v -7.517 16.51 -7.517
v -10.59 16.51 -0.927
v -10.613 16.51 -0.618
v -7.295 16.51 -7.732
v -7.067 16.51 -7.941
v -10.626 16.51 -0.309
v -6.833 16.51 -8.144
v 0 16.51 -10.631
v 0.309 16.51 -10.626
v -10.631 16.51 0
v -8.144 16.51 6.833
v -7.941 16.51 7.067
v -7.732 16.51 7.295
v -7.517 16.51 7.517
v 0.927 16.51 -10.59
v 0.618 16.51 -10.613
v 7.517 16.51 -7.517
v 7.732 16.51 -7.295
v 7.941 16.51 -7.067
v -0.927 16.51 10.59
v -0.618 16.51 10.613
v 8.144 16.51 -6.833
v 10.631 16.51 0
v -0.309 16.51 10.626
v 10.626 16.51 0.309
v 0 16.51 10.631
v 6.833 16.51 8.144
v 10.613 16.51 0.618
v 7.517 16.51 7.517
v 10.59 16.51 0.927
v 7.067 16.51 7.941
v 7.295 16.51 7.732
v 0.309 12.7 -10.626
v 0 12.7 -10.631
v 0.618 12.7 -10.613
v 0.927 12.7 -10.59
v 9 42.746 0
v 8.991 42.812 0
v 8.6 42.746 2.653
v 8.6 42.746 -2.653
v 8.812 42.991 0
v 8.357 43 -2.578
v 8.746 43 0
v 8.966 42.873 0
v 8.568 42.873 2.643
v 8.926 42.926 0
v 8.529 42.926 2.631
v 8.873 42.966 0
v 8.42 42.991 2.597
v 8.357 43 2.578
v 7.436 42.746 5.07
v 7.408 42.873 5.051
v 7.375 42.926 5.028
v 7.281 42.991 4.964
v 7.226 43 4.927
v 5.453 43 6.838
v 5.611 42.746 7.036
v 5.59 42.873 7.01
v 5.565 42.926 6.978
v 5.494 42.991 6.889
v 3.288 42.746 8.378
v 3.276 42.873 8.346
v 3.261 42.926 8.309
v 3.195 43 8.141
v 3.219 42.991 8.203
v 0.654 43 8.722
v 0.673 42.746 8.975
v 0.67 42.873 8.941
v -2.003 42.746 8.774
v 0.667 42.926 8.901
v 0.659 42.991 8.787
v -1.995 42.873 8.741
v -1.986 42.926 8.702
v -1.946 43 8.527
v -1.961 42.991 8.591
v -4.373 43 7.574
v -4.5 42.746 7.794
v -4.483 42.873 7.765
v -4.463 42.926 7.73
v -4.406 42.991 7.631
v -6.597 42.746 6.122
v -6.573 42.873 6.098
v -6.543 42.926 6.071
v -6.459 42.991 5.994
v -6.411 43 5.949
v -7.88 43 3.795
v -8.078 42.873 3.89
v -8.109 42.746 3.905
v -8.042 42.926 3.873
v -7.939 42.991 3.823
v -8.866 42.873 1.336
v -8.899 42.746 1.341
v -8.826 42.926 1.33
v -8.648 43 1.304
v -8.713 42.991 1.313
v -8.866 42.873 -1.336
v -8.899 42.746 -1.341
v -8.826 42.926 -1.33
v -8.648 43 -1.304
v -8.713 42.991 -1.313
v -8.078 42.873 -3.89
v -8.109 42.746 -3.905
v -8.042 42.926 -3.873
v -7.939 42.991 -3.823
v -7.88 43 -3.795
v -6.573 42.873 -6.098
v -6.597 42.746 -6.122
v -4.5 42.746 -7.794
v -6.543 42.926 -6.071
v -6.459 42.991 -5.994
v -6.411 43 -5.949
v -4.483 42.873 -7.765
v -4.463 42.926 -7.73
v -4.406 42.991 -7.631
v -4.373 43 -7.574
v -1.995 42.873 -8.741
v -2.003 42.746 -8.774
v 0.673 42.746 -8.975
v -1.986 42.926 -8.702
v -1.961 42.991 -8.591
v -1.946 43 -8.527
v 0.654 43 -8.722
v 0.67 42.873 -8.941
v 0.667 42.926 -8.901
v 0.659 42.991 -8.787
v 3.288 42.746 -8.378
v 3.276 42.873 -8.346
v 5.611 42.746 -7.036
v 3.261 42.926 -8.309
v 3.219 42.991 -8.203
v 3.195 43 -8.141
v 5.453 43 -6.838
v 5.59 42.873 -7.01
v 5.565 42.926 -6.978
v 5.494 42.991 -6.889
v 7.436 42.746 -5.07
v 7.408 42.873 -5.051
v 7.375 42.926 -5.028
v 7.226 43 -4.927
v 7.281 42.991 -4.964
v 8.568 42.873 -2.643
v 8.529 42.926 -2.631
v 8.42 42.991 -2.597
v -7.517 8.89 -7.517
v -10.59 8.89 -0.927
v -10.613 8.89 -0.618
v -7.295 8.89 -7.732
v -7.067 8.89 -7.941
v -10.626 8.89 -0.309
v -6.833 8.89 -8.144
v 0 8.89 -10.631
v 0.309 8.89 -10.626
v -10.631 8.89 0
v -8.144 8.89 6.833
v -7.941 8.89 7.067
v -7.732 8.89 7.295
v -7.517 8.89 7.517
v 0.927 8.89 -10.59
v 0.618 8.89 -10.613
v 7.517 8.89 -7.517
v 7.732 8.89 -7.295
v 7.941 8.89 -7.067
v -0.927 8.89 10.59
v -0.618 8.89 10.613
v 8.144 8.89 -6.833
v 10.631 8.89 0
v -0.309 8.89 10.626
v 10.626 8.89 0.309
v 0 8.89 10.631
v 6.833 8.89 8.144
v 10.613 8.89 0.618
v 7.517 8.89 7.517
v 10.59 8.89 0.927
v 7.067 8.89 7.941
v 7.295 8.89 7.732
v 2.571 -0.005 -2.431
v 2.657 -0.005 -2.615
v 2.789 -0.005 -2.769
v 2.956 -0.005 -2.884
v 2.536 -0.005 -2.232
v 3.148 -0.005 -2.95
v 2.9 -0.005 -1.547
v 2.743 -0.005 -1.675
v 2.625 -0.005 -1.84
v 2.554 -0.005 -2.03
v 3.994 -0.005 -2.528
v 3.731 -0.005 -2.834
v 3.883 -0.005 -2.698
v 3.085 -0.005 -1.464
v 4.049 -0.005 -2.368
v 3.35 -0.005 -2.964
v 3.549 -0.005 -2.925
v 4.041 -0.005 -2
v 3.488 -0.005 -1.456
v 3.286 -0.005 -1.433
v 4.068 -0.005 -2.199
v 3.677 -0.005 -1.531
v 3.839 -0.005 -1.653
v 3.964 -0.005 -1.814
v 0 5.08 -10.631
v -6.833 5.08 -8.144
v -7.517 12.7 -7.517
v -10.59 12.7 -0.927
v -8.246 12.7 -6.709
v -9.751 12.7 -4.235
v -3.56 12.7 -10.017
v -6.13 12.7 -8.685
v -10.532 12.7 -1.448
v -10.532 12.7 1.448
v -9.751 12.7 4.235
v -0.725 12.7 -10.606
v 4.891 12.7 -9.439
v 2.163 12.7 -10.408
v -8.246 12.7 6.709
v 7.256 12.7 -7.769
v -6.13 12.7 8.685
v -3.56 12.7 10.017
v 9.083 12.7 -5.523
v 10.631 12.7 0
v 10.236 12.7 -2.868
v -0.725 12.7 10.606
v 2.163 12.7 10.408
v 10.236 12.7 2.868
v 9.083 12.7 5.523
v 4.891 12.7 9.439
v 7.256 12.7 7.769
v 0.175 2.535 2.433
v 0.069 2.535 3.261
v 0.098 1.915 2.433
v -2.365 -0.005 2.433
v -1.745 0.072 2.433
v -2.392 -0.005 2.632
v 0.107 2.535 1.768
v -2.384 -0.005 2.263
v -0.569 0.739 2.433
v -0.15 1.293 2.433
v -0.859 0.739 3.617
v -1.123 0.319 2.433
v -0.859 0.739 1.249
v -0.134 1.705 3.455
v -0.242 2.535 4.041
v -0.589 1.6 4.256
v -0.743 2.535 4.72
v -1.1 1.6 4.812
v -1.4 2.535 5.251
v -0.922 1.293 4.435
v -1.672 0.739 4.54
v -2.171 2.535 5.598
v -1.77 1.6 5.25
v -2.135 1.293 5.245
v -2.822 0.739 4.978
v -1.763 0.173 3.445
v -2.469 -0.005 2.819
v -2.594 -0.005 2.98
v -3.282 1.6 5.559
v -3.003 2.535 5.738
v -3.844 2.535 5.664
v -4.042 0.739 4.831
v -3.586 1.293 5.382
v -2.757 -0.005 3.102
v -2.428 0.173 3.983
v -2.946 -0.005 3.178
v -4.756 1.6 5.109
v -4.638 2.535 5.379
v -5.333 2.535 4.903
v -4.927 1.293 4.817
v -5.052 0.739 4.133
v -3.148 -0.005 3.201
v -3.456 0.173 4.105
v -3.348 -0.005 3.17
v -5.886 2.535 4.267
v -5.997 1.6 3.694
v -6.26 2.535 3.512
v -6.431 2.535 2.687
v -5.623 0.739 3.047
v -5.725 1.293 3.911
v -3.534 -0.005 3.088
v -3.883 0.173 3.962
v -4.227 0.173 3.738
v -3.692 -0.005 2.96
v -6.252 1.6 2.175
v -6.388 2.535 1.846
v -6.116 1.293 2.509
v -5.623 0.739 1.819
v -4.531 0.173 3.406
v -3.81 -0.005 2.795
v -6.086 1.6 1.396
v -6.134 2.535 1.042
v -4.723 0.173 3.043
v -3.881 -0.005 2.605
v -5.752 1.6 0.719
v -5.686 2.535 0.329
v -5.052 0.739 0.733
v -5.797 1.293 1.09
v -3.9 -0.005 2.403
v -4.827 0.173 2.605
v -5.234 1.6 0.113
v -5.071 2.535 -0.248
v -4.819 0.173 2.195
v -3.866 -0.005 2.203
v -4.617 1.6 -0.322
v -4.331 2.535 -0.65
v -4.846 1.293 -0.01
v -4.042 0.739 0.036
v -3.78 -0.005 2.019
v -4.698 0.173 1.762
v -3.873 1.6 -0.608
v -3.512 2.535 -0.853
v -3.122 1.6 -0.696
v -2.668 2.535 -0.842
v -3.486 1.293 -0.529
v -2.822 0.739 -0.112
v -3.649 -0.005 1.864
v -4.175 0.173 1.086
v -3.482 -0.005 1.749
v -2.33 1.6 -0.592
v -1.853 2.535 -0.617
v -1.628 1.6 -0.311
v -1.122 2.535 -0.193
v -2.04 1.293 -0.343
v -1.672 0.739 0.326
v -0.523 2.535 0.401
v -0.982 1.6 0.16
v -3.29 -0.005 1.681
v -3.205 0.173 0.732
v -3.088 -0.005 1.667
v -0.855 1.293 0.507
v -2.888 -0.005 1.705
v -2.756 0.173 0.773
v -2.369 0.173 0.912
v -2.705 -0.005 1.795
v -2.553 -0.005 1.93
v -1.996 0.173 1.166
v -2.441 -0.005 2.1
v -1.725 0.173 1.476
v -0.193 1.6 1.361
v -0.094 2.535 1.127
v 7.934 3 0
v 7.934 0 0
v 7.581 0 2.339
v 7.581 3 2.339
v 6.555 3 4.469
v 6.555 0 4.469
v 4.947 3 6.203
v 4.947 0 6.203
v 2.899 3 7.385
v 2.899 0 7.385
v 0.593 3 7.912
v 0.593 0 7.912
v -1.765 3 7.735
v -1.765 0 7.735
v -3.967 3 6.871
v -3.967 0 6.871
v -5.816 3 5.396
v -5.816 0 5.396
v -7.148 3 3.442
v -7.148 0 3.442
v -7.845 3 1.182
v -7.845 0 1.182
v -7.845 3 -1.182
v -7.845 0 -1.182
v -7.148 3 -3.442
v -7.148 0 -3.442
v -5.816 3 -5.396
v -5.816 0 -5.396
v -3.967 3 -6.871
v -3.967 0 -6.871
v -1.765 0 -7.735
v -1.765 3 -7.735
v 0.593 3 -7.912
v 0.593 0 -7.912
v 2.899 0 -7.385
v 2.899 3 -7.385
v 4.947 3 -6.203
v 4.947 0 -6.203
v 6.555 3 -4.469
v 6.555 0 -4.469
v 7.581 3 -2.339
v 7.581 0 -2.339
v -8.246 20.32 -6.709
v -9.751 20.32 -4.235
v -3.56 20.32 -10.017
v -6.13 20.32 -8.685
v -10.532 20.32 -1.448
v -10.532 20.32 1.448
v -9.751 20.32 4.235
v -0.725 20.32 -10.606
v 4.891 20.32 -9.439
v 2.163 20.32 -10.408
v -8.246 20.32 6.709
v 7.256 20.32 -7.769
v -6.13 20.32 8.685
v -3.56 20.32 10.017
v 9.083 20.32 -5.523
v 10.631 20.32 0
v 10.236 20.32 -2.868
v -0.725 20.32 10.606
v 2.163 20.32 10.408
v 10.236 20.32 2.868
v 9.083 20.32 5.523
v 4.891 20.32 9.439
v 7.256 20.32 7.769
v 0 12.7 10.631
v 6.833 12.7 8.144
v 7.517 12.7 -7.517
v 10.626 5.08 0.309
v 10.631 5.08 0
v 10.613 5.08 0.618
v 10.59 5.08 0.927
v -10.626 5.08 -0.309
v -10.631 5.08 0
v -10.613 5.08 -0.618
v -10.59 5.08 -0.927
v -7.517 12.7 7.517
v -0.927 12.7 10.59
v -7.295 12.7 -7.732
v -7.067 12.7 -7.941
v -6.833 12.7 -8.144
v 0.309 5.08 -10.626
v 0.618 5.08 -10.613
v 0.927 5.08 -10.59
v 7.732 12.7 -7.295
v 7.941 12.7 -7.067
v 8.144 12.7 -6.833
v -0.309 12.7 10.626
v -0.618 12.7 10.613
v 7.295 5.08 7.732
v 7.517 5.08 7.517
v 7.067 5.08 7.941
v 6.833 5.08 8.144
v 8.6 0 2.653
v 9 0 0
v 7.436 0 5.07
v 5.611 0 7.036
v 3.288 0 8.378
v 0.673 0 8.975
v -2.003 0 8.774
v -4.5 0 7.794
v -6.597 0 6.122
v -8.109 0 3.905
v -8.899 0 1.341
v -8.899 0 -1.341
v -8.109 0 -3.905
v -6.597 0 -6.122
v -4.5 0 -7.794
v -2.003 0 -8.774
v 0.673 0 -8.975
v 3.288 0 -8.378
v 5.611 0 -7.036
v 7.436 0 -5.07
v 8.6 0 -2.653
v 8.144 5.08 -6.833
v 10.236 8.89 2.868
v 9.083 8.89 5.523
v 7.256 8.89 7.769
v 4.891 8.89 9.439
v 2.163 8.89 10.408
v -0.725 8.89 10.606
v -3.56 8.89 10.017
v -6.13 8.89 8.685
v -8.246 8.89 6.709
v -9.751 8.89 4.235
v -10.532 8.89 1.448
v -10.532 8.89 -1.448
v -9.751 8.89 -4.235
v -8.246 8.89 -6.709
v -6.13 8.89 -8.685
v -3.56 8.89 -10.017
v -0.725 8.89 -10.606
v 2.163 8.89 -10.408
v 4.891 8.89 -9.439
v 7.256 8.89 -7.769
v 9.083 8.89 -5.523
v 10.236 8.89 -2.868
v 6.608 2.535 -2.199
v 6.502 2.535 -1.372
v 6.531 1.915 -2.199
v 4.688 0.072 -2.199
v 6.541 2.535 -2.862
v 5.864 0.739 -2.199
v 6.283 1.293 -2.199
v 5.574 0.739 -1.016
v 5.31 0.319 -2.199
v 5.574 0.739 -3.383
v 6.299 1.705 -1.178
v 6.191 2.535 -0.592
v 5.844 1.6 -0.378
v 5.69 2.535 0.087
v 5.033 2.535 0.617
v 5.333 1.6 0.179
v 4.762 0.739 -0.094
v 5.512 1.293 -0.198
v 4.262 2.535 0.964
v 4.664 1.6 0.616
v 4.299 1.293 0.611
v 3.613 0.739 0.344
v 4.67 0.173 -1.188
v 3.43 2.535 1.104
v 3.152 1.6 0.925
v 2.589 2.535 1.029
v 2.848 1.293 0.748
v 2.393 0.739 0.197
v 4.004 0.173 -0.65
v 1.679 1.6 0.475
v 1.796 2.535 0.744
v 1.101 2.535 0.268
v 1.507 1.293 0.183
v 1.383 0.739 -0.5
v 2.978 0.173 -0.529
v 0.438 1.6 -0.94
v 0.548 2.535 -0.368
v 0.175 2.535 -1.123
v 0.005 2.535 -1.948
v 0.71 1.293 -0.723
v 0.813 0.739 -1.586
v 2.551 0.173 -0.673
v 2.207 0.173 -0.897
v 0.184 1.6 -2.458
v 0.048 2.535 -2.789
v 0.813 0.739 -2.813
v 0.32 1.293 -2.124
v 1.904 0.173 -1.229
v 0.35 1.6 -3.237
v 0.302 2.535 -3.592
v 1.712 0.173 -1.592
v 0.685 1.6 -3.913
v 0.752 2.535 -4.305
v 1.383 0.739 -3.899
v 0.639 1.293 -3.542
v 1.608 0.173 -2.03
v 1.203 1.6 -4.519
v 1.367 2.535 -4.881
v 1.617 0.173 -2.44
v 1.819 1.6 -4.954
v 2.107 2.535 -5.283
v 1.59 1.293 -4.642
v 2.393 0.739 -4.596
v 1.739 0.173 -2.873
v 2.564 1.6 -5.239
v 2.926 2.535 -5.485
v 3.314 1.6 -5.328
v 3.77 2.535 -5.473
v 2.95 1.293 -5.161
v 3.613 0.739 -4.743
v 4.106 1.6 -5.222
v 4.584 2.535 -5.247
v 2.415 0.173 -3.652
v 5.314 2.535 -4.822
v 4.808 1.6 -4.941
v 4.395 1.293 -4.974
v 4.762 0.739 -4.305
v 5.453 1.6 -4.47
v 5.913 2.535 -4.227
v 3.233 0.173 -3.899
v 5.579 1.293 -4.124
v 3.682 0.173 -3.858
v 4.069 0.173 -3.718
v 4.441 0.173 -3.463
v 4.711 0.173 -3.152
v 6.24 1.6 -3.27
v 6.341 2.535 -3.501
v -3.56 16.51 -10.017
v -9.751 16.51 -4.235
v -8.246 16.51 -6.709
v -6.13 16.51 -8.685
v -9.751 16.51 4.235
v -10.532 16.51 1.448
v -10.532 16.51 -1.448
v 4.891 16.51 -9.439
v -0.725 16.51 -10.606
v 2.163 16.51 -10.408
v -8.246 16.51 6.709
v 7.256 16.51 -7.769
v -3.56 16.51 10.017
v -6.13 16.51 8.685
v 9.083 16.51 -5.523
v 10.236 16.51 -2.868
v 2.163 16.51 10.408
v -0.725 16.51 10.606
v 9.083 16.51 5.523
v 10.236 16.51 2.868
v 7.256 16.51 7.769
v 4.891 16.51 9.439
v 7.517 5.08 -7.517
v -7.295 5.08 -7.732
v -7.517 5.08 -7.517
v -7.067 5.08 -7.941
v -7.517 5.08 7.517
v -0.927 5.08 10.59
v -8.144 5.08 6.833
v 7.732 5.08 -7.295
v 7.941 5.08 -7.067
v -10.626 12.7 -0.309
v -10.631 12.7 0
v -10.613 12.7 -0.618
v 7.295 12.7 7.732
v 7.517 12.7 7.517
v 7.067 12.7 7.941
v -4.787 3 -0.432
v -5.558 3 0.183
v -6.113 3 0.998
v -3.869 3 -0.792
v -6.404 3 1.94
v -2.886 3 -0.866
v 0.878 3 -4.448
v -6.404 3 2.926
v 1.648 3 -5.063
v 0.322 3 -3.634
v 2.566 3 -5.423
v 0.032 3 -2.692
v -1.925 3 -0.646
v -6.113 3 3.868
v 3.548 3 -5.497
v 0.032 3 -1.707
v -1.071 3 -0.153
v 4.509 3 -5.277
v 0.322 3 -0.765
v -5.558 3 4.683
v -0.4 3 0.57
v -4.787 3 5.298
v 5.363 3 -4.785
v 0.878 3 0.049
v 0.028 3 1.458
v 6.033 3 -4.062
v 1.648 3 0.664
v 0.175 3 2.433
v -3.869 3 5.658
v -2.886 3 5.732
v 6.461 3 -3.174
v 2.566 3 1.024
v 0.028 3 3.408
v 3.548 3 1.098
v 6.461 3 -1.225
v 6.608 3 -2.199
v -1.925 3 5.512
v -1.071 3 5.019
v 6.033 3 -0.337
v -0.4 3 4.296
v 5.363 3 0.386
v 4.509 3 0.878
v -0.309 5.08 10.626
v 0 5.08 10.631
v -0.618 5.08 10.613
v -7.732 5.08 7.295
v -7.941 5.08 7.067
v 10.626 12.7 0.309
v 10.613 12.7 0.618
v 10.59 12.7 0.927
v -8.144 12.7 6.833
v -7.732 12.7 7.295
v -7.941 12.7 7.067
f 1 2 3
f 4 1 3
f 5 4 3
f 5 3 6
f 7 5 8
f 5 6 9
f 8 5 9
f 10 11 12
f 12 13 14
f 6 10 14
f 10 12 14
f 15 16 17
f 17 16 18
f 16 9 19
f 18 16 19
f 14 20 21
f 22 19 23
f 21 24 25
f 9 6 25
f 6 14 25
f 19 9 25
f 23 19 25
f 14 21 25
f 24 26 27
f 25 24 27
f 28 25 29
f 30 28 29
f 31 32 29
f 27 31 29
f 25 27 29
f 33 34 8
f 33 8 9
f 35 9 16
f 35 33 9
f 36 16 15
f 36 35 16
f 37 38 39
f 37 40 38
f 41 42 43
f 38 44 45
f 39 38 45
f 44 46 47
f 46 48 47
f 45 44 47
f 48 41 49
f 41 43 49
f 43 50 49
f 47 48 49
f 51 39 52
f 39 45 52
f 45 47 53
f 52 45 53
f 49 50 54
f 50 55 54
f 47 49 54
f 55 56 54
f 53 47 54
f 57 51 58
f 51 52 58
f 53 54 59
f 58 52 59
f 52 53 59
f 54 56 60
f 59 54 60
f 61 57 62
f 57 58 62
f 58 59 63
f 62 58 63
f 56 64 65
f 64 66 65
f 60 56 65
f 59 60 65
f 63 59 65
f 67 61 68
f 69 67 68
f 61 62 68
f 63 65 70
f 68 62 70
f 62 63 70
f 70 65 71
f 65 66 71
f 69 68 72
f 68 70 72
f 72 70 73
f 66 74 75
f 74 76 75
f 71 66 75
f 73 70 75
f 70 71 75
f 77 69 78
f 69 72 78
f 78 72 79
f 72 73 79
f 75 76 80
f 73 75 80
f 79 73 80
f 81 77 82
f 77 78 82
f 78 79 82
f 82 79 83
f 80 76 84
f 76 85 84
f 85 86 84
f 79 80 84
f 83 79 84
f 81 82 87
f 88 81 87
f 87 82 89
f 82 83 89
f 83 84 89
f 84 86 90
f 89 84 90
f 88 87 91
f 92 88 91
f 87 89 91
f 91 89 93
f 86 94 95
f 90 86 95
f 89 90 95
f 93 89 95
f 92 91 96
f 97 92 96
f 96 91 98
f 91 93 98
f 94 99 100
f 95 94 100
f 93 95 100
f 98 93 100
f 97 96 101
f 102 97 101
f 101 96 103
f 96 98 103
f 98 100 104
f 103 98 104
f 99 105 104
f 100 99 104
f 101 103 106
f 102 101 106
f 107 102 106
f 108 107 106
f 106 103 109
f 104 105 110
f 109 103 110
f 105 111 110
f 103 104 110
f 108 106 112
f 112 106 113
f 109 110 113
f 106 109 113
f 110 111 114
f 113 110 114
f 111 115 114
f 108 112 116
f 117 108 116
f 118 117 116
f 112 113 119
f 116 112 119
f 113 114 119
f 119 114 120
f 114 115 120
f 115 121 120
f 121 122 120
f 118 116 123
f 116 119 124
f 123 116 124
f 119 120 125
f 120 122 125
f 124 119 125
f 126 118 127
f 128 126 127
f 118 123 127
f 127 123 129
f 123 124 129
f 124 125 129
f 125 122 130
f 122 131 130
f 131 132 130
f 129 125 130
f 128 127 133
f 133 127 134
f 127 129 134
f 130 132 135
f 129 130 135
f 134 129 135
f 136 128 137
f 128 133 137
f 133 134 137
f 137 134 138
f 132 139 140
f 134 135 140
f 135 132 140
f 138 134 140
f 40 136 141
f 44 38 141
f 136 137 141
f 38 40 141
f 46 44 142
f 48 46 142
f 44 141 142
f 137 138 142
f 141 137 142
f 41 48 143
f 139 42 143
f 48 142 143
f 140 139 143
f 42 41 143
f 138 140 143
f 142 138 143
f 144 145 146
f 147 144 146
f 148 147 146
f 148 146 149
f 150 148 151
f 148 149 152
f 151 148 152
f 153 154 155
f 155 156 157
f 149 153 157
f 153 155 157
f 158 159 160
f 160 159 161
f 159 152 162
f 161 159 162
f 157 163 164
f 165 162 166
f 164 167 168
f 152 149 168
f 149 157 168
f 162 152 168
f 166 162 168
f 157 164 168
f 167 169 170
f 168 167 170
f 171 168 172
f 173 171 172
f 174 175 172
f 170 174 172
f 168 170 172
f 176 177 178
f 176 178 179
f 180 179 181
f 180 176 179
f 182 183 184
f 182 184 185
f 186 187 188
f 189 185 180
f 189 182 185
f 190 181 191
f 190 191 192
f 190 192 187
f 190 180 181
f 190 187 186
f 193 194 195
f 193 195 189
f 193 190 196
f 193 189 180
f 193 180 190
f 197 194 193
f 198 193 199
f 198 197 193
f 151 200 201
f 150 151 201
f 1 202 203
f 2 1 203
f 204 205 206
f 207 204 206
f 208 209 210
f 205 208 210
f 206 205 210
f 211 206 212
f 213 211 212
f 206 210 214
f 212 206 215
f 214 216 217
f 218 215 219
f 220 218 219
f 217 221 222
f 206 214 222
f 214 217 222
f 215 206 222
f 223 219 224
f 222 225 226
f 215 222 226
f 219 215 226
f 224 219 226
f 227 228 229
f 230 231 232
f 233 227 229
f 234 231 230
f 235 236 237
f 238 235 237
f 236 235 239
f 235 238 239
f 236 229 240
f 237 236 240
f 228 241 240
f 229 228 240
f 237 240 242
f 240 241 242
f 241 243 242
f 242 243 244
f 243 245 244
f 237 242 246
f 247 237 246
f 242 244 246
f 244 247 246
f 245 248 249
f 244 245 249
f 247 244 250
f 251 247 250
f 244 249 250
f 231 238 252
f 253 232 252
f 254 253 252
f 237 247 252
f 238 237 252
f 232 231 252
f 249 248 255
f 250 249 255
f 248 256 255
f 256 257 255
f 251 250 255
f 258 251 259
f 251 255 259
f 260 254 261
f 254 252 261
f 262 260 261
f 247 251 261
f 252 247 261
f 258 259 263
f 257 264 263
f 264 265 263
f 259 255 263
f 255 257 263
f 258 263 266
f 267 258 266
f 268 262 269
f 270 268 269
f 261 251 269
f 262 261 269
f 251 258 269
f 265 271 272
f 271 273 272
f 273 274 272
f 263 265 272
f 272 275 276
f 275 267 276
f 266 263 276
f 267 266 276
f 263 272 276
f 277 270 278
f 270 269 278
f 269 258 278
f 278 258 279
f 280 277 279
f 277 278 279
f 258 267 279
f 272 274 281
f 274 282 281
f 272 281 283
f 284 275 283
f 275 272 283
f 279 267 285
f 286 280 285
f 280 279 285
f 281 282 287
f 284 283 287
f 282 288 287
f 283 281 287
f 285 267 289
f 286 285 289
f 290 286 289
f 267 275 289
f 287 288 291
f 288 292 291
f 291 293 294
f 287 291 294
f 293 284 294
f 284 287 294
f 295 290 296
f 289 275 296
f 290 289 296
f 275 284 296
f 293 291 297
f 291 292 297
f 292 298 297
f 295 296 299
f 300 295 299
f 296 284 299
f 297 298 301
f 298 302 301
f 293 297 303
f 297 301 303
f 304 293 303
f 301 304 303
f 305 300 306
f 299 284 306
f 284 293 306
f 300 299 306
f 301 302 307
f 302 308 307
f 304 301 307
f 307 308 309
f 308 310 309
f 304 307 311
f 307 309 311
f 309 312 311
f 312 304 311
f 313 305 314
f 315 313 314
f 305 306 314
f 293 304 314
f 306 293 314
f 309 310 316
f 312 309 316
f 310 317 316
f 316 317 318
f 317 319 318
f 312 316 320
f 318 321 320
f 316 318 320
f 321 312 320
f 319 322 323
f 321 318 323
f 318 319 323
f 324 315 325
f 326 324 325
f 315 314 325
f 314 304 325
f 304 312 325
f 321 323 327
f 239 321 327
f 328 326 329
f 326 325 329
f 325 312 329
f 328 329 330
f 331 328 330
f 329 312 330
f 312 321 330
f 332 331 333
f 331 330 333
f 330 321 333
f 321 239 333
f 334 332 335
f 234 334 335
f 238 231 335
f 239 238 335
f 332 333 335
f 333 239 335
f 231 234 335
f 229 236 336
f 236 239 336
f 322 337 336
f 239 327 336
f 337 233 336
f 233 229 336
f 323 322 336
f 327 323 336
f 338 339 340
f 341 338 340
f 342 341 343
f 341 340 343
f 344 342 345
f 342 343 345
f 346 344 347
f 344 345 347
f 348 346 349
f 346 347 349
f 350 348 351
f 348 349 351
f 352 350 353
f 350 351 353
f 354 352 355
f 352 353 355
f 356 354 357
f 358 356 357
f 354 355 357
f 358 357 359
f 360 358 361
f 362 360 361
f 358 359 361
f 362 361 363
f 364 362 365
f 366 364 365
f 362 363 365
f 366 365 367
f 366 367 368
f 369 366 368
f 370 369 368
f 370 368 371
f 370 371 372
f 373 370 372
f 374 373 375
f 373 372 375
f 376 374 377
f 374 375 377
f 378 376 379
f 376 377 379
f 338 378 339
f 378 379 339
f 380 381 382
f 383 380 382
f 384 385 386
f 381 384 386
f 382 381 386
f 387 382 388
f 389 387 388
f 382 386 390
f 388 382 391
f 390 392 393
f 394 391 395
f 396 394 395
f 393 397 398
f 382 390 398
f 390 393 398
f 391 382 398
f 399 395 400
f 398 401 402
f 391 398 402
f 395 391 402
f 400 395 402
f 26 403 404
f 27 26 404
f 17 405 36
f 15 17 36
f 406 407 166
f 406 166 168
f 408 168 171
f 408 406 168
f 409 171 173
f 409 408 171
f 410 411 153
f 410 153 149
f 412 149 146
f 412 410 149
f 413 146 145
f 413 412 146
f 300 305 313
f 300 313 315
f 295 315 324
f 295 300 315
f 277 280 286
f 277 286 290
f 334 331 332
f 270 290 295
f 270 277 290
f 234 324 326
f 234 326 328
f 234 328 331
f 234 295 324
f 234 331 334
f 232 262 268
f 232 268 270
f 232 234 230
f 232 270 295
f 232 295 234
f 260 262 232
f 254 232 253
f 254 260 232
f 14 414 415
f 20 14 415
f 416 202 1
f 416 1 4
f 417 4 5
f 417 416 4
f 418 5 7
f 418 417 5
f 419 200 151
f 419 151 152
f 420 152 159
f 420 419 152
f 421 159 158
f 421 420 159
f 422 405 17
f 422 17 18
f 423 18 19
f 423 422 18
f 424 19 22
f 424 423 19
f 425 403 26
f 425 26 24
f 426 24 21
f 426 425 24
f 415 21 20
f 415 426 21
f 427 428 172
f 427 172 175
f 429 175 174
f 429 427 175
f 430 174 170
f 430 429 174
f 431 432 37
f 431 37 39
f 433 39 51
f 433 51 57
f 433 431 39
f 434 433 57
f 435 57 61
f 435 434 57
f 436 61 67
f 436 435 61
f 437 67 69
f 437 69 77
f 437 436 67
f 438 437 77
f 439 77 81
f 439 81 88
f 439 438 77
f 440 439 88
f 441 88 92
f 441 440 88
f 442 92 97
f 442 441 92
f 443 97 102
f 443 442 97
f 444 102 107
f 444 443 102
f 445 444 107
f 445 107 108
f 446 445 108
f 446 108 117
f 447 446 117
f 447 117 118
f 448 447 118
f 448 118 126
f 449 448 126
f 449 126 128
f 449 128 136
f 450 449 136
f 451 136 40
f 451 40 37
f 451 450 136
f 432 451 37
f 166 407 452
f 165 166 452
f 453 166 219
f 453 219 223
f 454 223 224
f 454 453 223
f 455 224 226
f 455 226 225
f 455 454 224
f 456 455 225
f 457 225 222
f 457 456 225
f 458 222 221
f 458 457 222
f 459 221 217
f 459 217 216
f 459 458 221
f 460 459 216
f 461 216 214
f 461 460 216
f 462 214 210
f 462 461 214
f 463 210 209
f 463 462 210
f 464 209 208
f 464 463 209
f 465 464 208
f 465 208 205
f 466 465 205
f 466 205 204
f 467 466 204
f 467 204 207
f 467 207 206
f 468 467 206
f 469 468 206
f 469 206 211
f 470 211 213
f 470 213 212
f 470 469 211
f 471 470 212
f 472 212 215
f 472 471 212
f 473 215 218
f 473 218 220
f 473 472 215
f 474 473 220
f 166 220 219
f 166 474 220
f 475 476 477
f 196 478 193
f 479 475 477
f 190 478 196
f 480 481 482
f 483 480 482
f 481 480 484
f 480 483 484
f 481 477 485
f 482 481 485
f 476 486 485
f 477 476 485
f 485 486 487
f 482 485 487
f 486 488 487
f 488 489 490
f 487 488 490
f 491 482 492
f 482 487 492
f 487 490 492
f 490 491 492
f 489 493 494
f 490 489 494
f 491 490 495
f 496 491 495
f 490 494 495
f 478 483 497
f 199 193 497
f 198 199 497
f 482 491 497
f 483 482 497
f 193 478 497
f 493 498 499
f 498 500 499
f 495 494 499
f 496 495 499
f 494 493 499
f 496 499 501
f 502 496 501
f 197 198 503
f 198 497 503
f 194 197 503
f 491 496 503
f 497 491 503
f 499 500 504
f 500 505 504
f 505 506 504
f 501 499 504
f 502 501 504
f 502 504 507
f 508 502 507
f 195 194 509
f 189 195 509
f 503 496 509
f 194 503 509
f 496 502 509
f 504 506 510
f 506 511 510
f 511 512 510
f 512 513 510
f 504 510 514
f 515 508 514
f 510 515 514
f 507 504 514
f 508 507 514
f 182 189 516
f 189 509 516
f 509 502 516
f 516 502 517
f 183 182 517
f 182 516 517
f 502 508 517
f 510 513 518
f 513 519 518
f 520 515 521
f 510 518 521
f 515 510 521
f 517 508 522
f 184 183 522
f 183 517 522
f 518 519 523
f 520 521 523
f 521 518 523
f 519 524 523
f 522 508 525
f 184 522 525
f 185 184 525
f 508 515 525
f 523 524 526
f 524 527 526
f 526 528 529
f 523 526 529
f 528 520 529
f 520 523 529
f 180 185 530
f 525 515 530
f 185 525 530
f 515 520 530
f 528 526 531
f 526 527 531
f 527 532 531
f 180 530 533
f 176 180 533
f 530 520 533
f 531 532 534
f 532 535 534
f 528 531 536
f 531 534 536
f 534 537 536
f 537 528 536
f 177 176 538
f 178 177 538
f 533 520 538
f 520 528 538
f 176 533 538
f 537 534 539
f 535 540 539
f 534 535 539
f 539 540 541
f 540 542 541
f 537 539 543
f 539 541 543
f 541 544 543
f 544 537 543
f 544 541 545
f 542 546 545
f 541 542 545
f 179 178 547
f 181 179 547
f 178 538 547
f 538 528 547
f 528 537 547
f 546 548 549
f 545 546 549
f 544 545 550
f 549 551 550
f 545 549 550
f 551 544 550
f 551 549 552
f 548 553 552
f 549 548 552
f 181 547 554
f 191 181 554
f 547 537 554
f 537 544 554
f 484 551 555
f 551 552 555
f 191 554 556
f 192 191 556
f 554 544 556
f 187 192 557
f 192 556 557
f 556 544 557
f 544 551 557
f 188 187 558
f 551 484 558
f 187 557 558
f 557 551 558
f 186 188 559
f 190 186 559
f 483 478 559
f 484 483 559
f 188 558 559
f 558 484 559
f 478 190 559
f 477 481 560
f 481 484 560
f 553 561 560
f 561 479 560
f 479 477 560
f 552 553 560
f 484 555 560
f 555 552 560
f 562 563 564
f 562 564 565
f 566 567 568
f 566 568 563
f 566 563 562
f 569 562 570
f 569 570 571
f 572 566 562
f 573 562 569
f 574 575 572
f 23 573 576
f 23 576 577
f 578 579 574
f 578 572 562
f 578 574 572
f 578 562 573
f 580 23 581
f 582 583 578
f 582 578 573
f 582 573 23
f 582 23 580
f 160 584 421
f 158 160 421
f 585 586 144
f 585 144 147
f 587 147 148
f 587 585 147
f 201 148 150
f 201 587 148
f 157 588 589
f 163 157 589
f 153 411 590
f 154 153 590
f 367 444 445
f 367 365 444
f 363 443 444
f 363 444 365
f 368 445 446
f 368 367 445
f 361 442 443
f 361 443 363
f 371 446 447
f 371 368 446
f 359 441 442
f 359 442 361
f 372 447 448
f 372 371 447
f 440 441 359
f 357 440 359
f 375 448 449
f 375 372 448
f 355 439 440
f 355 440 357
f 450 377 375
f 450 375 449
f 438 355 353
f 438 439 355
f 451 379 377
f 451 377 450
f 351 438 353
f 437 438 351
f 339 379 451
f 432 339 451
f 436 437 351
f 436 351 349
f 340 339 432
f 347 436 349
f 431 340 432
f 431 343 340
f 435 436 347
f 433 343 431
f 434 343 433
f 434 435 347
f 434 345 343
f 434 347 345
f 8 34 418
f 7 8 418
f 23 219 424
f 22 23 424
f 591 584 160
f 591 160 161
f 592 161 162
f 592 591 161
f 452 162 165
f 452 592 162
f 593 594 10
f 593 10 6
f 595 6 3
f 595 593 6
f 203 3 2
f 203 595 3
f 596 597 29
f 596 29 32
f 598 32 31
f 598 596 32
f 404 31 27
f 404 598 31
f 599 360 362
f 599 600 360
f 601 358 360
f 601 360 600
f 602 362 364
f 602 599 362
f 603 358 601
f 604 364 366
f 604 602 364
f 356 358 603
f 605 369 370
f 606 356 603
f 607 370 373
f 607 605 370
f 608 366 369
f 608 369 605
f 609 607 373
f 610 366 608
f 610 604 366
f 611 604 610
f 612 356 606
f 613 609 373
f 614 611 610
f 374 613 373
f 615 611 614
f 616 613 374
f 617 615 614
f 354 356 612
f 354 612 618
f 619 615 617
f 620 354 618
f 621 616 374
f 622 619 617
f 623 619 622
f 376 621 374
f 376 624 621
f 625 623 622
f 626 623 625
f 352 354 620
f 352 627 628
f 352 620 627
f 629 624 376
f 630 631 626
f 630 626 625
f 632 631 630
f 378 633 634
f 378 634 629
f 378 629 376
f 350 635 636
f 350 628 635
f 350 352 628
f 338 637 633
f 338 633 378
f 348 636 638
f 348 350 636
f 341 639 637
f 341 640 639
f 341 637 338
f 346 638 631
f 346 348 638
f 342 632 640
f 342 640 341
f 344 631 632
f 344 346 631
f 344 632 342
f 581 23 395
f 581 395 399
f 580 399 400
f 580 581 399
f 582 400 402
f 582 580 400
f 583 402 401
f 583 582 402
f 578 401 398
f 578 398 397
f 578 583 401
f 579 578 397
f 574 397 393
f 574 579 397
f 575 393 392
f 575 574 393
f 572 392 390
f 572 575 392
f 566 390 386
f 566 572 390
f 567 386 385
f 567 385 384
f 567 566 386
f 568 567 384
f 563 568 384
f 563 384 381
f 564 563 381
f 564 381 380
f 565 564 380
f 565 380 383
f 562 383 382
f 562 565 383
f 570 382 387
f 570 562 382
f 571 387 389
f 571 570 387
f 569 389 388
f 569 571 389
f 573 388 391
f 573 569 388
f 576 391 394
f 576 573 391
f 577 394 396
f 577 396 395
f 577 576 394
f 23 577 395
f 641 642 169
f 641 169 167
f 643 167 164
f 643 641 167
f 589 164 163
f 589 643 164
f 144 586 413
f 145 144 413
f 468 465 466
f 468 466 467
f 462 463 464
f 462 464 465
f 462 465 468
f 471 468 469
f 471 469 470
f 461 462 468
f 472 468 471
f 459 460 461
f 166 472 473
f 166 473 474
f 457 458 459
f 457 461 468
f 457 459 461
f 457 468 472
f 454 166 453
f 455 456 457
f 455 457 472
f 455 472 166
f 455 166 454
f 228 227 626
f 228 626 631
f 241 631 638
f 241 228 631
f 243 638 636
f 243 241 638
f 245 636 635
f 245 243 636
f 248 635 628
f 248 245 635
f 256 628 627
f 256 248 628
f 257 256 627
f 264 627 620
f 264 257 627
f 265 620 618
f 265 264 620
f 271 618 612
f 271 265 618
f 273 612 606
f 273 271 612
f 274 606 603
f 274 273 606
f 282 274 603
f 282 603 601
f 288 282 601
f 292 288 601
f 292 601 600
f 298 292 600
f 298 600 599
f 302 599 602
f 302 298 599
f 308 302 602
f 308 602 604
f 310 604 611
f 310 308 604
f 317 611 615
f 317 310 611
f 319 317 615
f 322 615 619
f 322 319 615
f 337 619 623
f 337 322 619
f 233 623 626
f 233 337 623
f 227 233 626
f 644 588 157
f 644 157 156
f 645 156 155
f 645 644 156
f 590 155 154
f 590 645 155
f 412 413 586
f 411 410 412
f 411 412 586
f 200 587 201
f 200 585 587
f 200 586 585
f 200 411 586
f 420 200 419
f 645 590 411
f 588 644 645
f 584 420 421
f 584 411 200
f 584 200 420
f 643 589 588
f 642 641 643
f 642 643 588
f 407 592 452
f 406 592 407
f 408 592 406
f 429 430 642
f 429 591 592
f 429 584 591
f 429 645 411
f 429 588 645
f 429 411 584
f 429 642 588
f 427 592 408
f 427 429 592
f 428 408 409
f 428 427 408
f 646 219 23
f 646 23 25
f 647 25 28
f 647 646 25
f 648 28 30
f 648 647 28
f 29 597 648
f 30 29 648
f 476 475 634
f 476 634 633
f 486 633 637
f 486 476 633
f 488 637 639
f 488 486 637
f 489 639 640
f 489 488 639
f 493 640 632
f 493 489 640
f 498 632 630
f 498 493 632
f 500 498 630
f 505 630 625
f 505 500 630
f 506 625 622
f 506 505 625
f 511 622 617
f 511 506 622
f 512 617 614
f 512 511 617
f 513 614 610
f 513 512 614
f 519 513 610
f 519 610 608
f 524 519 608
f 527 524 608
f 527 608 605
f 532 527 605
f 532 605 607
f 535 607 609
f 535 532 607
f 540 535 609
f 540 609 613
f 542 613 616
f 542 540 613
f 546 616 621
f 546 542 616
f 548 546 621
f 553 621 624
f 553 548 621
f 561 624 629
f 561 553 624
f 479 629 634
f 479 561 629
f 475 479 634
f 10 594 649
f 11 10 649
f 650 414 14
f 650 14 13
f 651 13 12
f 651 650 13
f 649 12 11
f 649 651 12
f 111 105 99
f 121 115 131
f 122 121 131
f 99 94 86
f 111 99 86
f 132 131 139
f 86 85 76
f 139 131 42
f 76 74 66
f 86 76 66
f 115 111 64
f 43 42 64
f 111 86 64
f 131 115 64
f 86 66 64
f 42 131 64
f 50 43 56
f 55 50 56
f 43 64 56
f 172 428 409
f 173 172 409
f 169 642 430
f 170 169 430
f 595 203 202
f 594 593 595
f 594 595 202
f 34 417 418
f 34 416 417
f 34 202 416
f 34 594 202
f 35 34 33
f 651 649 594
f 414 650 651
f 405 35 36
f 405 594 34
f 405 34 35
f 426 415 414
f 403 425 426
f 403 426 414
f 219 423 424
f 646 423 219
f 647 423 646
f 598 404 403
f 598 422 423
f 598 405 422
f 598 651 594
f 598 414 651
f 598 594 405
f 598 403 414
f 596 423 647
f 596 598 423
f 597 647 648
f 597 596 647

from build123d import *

# Parameters (mm, degrees)
F0_R             = 9
F1_DEPTH         = 43
F2_R             = 7.9338373334
F2_R_2           = 3.3064142063
F2_R_3           = 3.3078684587
F3_DEPTH         = 3
F4_DEPTH         = 0.005
F5_R             = 2.54
F6_R             = 0.254
F8_R             = 10.630598255
F9_DEPTH         = 3.81
F10_DEPTH        = 3.81
F11_DEPTH        = 3.81
F12_DEPTH        = 3.81
F14_DEPTH        = 3.81
F14_COPIES_COUNT = 8
F16_DEPTH        = 3.81
F16_COPIES_COUNT = 8


# Not quite as in the source:
# - a pattern or mirror of a feature is missing from the dataset's text; its kind, count and spacing are read off the source's solid


with BuildPart() as f1:
    # F0 (on Front) → F1 (new body)
    with BuildSketch(Plane.XZ):
        Circle(F0_R)
    extrude(amount=-F1_DEPTH)

    # F2 (on face) → F3 (cut)
    with BuildSketch(Plane.XZ):
        Circle(F2_R)
        with Locations((3.3013214234, -2.1994818862)):
            Circle(F2_R_2, mode=Mode.SUBTRACT)
        with Locations((-3.133161364, 2.4330523165)):
            Circle(F2_R_3, mode=Mode.SUBTRACT)
    extrude(amount=-F3_DEPTH, mode=Mode.SUBTRACT)

    # F4 (add): faces of the model
    f4_faces = [f1.faces().sort_by_distance(p)[0] for p in [
        (-3.133161364, 0, 2.4330523165),
        (3.3013214234, 0, -2.1994818862),
    ]]
    extrude(f4_faces, amount=F4_DEPTH)

    # F5
    f5_edges = [f1.edges().sort_by_distance(p)[0] for p in [
        (-6.44103, -0.005, 2.433052),
        (-0.005093, -0.005, -2.199482),
    ]]
    fillet(f5_edges, radius=F5_R)

    # F6
    f6_edges = [f1.edges().sort_by_distance(p)[0] for p in [
        (-9, 43, 0),
    ]]
    fillet(f6_edges, radius=F6_R)


with BuildPart() as f9:
    # F8 (on offset) → F9 (new body)
    with BuildSketch(Plane.XZ.offset(-5.08)):
        Circle(F8_R)
    extrude(amount=-F9_DEPTH)


with BuildPart() as f10:
    # F10 (new): a face of the model
    f10_faces = [f9.part.faces().sort_by_distance(p)[0] for p in [
        (0, 8.89, 0),
    ]]
    extrude(f10_faces, amount=F10_DEPTH)


with BuildPart() as f11:
    # F11 (new): a face of the model
    f11_faces = [f10.part.faces().sort_by_distance(p)[0] for p in [
        (0, 12.7, 0),
    ]]
    extrude(f11_faces, amount=F11_DEPTH)


with BuildPart() as f12:
    # F12 (new): a face of the model
    f12_faces = [f11.part.faces().sort_by_distance(p)[0] for p in [
        (0, 16.51, 0),
    ]]
    extrude(f12_faces, amount=F12_DEPTH)


with BuildPart() as f9_1:
    add(f9.part)

    # F13 (on face) → F14 (cut)
    with BuildSketch(Plane.XZ.offset(-5.08)):
        with BuildLine():
            ThreePointArc((6.8332168419, 8.1435107203), (3.6358787388, 9.9894947348), (0, 10.630598255))
            Line((0, 10.630598255), (6.8332168419, 8.1435107203))
        make_face()
    f14 = extrude(amount=-F14_DEPTH, mode=Mode.SUBTRACT)

    # F14_copies: F14 ×8 about axis
    f14_copies_axis = Axis((0, 0, 0), (0, 1, 0))
    for i in range(1, F14_COPIES_COUNT):
        add(f14.rotate(f14_copies_axis, i * 360 / F14_COPIES_COUNT), mode=Mode.SUBTRACT)


with BuildPart() as f11_1:
    add(f11.part)

    # F15 (on face) → F16 (cut)
    with BuildSketch(Plane.XZ.offset(-12.7)):
        with BuildLine():
            Line((0, 10.630598255), (6.8332168419, 8.1435107203))
            ThreePointArc((6.8332168419, 8.1435107203), (3.6358787388, 9.9894947348), (0, 10.630598255))
        make_face()
    f16 = extrude(amount=-F16_DEPTH, mode=Mode.SUBTRACT)

    # F16_copies: F16 ×8 about axis
    f16_copies_axis = Axis((0, 0, 0), (0, 1, 0))
    for i in range(1, F16_COPIES_COUNT):
        add(f16.rotate(f16_copies_axis, i * 360 / F16_COPIES_COUNT), mode=Mode.SUBTRACT)


solid = Compound([f1.part, f10.part, f12.part, f9_1.part, f11_1.part])
